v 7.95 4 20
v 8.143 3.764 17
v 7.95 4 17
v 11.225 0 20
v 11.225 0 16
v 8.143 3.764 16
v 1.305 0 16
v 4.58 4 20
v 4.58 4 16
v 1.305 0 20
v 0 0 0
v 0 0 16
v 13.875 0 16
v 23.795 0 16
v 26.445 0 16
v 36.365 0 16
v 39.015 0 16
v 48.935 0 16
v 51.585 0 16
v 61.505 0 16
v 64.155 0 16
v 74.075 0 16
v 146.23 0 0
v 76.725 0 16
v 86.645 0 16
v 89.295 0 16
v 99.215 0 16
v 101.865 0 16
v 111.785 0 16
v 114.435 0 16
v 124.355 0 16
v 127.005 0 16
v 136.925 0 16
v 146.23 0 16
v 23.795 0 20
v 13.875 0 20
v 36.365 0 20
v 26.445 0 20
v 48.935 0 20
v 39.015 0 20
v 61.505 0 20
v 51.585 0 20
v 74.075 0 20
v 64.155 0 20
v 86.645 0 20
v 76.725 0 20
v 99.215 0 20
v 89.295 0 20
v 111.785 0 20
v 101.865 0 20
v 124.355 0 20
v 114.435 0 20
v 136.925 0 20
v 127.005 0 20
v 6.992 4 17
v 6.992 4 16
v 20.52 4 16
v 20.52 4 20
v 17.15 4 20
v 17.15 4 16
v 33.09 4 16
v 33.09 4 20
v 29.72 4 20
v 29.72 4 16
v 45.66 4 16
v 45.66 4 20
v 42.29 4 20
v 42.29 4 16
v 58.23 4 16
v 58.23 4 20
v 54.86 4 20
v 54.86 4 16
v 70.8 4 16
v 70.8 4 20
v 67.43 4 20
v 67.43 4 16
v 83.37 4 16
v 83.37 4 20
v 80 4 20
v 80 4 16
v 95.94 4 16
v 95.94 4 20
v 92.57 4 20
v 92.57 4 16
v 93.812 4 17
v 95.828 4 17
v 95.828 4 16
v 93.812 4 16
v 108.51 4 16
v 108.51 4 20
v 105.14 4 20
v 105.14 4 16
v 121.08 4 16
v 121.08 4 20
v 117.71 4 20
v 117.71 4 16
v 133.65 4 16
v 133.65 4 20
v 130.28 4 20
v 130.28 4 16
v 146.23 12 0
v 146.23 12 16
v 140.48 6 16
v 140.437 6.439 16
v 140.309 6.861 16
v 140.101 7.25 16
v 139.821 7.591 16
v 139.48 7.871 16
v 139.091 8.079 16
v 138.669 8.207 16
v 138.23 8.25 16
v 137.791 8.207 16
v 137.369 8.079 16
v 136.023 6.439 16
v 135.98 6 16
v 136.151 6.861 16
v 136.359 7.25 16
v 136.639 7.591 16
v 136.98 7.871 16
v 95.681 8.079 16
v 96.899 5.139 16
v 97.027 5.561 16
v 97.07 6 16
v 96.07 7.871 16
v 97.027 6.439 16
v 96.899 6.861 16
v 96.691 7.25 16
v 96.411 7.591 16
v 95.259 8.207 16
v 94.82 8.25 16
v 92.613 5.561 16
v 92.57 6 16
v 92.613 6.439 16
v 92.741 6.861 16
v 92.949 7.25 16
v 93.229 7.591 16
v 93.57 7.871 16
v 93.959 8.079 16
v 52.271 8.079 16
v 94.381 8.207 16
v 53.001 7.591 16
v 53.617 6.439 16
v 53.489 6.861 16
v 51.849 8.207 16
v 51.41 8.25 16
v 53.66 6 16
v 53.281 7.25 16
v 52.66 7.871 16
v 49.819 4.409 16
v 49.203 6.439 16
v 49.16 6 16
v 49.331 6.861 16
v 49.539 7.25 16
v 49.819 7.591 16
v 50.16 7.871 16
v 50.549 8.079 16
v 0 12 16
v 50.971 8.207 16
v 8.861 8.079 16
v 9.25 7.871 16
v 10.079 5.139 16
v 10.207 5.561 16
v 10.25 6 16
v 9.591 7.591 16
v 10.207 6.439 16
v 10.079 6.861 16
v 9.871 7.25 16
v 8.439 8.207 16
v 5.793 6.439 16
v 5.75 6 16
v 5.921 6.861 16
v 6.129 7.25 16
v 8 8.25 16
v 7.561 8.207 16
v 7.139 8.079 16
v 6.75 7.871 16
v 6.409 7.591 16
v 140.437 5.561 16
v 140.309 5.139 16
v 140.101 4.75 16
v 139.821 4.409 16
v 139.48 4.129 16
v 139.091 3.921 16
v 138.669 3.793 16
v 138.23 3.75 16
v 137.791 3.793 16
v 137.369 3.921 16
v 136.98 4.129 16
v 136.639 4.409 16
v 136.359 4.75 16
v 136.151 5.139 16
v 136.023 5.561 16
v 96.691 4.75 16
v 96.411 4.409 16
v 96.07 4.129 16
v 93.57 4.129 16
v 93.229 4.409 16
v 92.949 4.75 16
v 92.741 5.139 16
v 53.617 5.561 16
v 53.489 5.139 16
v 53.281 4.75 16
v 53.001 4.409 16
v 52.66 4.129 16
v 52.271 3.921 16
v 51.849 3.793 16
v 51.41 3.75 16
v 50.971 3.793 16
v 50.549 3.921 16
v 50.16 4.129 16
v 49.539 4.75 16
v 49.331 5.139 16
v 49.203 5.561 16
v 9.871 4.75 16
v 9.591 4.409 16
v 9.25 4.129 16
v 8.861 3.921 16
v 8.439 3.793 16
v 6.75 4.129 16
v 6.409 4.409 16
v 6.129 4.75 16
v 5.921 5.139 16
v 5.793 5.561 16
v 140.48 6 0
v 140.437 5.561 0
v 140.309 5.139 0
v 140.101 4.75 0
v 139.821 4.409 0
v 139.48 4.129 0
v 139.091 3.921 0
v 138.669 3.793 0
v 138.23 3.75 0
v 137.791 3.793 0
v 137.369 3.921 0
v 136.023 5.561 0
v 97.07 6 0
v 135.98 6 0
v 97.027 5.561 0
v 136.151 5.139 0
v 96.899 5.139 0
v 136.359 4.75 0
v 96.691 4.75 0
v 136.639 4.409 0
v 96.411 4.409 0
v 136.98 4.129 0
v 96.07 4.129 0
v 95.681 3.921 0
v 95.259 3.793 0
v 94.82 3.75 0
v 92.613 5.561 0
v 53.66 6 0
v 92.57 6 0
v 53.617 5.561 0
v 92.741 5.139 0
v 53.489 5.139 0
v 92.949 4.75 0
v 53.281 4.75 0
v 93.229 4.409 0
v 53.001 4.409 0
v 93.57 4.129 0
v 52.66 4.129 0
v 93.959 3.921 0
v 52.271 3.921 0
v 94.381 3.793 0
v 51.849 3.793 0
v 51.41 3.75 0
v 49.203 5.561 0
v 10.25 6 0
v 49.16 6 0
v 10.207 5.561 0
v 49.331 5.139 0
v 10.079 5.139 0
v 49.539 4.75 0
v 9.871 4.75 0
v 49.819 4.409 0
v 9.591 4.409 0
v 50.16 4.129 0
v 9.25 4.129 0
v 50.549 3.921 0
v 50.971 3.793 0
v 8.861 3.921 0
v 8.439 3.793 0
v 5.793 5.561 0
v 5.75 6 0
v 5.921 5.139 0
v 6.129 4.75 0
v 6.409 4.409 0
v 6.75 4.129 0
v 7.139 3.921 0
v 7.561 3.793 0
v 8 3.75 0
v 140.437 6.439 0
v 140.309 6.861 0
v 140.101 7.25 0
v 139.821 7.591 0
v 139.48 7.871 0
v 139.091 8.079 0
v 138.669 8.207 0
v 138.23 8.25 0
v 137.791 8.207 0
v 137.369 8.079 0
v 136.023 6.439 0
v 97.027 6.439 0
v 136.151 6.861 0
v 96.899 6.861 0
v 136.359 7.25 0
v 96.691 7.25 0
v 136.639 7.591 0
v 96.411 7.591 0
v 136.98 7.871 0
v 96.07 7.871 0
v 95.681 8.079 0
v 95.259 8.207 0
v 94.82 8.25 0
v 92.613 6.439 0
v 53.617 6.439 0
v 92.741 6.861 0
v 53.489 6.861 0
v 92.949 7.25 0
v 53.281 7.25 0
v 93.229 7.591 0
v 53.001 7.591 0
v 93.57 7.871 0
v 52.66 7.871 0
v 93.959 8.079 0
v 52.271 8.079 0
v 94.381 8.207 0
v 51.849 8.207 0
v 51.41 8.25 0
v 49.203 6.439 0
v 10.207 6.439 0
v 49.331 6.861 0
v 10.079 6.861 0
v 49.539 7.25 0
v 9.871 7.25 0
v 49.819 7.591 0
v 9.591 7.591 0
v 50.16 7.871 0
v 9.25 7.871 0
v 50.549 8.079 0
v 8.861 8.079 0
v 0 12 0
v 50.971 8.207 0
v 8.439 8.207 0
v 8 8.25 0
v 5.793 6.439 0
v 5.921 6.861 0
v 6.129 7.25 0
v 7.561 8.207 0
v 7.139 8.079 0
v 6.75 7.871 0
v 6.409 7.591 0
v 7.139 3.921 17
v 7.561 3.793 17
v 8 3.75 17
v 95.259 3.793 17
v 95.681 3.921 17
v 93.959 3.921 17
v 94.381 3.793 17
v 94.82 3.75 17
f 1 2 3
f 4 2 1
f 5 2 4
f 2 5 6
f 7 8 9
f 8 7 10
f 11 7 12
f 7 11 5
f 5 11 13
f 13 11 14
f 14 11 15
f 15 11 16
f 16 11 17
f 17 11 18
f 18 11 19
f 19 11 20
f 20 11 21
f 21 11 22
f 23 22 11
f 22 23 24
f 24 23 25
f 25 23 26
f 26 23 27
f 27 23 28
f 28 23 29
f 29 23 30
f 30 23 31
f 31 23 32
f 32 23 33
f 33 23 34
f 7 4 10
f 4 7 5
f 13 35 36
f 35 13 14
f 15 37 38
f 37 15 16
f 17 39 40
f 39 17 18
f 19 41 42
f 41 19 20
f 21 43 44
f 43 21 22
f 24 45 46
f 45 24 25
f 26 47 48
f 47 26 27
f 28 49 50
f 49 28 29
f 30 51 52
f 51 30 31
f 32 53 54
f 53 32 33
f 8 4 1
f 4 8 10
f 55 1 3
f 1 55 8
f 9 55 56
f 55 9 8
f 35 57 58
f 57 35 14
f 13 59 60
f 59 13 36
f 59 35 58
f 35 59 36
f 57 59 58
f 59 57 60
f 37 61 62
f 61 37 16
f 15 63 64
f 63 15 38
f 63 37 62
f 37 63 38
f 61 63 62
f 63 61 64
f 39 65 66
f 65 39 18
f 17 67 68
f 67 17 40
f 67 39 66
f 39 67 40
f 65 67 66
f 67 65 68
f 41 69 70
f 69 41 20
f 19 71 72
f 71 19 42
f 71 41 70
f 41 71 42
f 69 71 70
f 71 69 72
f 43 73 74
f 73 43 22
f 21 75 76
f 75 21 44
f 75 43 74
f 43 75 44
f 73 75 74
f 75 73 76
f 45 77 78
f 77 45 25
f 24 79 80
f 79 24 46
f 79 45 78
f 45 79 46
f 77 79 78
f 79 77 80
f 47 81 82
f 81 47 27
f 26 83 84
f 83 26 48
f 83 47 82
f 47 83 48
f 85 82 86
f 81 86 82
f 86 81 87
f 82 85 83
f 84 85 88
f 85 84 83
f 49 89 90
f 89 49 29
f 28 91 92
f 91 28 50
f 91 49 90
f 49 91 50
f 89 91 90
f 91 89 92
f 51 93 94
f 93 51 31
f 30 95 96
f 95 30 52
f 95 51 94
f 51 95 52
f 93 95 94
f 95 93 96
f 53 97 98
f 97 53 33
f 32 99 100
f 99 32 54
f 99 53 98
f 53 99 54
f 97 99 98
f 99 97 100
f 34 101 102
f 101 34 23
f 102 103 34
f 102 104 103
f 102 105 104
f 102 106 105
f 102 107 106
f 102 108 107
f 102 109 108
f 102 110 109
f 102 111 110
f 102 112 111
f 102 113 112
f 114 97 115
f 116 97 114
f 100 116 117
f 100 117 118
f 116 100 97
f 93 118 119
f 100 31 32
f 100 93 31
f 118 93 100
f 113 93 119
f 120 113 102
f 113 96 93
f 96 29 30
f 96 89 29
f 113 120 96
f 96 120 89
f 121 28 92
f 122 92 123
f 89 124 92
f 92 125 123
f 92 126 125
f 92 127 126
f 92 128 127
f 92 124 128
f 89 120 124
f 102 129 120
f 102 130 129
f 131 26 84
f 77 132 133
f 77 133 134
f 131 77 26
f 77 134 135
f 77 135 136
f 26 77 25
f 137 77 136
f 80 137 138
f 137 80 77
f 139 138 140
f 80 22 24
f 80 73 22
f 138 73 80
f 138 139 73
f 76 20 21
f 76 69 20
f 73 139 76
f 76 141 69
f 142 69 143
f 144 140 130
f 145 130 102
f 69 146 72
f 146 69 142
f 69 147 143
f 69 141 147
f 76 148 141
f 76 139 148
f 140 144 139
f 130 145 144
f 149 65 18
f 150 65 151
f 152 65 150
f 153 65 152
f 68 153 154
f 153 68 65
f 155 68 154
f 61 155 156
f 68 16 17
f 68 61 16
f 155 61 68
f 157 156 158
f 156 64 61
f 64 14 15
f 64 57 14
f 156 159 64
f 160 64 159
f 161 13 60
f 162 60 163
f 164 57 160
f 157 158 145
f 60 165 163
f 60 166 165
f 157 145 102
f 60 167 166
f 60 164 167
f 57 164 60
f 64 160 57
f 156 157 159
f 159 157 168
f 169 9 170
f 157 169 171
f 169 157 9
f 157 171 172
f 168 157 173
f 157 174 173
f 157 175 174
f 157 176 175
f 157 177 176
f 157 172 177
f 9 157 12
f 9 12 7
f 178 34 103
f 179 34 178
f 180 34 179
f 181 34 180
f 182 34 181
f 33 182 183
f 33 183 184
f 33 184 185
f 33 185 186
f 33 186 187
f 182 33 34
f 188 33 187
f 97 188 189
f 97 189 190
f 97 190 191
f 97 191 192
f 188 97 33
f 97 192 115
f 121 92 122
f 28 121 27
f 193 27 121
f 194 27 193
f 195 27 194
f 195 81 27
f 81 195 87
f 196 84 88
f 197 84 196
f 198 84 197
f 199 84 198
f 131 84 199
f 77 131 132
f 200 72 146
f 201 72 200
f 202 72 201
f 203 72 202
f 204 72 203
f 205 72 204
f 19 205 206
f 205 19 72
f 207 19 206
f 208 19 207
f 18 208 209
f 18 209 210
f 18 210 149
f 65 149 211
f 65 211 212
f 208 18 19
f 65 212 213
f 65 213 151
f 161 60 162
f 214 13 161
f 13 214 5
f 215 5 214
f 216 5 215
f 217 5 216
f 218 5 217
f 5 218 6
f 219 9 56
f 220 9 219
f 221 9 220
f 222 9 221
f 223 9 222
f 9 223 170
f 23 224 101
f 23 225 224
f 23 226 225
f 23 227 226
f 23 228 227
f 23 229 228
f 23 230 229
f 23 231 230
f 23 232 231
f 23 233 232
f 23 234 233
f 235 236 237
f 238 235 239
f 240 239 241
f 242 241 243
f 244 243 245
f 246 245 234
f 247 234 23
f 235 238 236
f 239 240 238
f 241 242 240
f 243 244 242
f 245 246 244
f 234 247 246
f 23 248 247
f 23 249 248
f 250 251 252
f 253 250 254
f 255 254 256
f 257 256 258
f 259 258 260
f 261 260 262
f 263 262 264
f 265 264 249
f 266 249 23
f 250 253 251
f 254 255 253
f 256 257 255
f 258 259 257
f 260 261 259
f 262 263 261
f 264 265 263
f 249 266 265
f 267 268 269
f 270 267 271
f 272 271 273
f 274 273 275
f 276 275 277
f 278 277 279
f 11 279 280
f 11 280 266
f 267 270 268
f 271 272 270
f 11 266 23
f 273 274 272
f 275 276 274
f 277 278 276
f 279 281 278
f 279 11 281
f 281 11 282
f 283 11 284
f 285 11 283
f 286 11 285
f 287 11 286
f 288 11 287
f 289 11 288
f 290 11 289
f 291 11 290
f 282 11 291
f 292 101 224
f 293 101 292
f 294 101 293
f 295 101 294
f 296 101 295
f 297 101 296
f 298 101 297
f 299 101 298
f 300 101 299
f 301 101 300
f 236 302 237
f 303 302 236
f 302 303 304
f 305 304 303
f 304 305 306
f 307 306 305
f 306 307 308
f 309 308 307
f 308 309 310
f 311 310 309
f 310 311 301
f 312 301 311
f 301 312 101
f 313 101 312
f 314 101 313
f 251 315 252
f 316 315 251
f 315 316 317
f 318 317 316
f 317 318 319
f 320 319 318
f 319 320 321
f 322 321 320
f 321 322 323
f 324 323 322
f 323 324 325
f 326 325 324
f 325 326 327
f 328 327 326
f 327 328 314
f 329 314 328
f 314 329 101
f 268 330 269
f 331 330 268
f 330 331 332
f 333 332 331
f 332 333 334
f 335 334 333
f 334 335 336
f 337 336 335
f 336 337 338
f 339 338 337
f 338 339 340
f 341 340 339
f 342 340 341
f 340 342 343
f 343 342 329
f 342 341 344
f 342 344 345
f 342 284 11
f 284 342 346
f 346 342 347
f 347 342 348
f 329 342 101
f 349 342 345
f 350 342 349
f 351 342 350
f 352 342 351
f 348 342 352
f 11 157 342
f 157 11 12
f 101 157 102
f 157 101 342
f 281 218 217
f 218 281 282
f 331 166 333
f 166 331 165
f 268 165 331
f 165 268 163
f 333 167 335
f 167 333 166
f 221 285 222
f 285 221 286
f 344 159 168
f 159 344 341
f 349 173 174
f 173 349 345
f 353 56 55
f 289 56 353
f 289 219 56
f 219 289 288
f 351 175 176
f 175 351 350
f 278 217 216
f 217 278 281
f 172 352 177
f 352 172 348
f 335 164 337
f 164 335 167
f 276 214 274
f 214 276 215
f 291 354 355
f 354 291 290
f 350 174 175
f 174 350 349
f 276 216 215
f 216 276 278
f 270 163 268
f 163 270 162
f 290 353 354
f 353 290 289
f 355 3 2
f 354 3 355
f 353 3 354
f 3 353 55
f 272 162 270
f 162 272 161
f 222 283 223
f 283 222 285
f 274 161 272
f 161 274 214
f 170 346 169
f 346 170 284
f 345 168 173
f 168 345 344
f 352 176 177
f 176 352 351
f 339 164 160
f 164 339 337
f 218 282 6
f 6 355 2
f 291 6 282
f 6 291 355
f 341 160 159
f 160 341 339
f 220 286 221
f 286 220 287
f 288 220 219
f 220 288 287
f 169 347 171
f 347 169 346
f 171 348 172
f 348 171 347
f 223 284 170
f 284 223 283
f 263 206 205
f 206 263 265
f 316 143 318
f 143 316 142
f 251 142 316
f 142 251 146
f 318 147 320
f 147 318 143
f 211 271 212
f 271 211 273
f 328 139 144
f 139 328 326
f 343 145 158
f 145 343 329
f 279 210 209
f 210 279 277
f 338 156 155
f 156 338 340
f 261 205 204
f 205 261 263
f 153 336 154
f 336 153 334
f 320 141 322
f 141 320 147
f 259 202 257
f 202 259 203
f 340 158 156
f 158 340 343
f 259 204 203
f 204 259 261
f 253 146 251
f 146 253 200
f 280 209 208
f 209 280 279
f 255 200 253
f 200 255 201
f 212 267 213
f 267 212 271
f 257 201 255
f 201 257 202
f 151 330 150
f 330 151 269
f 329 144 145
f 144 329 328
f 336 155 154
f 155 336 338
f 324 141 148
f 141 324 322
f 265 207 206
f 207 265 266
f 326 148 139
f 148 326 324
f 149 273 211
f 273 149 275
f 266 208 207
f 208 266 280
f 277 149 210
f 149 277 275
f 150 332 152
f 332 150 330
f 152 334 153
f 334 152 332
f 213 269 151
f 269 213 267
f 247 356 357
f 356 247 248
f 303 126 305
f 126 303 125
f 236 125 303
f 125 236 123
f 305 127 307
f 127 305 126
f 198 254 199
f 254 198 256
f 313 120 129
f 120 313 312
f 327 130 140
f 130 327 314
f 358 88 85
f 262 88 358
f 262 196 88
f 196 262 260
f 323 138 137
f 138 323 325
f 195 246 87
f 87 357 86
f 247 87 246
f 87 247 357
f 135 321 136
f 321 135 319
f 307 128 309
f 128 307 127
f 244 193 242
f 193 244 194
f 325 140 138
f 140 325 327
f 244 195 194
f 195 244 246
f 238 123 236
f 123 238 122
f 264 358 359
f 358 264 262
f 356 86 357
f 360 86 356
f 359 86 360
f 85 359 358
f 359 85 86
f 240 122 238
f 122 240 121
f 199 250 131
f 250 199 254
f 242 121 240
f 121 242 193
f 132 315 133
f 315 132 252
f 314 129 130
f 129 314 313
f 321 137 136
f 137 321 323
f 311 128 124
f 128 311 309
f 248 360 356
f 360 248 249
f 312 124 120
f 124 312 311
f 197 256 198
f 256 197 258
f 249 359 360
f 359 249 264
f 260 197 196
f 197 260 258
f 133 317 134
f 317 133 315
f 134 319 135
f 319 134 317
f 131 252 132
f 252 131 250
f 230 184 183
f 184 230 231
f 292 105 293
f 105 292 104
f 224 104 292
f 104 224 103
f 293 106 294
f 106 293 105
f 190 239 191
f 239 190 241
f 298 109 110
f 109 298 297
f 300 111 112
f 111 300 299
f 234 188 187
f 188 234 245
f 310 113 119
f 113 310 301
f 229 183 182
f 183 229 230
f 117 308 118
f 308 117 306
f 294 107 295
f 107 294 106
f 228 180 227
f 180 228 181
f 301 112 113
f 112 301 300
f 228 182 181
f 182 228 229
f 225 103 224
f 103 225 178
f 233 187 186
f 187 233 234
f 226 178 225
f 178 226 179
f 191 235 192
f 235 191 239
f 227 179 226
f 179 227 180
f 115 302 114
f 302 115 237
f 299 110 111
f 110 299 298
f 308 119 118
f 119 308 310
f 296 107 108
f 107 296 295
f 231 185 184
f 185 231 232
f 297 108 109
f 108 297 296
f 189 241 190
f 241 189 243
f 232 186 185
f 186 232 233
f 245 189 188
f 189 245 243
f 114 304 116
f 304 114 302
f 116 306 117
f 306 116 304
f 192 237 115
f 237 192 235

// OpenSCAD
$fn = 32;

// ----------------------------------------------------------------------
// Gear rack: m=4 z=11, 146.23 x 12 x 20 mm
// ----------------------------------------------------------------------

// --- parameters (mm) ---
length = 146.23;          // rack length, X
width = 12;               // rack width, Y
height = 20;              // overall height, Z
module_m = 4;             // module
back_t = 16;              // tooth root line height
pitch = 12.57;            // circular pitch
tip_w = 3.37;             // tooth thickness at the tip
root_w = 9.92;            // tooth thickness at the root line
hole_d = 4.5;             // mounting hole
sink = 0.6;               // tooth root overlap into the body

tooth_span = 138.23;

module tooth(x0) {
  /* 20 deg flank profile, sunk into the body for a positive overlap */
  translate([x0, 0, back_t - sink])
    linear_extrude(height = height - back_t + sink)
      polygon(points = [[-root_w / 2, 0], [root_w / 2, 0],
                        [tip_w / 2, height - back_t],
                        [-tip_w / 2, height - back_t]]);
}

difference() {
  union() {
    cube([length, width, back_t]);
    for (i = [0 : 11 - 1])
      tooth((i + 0.5) * pitch + (tooth_span - 11 * pitch) / 2);
  }
  translate([8, 6, -1]) cylinder(h = back_t + 2, d = hole_d);
  translate([51.41, 6, -1]) cylinder(h = back_t + 2, d = hole_d);
  translate([94.82, 6, -1]) cylinder(h = back_t + 2, d = hole_d);
  translate([138.23, 6, -1]) cylinder(h = back_t + 2, d = hole_d);
}
